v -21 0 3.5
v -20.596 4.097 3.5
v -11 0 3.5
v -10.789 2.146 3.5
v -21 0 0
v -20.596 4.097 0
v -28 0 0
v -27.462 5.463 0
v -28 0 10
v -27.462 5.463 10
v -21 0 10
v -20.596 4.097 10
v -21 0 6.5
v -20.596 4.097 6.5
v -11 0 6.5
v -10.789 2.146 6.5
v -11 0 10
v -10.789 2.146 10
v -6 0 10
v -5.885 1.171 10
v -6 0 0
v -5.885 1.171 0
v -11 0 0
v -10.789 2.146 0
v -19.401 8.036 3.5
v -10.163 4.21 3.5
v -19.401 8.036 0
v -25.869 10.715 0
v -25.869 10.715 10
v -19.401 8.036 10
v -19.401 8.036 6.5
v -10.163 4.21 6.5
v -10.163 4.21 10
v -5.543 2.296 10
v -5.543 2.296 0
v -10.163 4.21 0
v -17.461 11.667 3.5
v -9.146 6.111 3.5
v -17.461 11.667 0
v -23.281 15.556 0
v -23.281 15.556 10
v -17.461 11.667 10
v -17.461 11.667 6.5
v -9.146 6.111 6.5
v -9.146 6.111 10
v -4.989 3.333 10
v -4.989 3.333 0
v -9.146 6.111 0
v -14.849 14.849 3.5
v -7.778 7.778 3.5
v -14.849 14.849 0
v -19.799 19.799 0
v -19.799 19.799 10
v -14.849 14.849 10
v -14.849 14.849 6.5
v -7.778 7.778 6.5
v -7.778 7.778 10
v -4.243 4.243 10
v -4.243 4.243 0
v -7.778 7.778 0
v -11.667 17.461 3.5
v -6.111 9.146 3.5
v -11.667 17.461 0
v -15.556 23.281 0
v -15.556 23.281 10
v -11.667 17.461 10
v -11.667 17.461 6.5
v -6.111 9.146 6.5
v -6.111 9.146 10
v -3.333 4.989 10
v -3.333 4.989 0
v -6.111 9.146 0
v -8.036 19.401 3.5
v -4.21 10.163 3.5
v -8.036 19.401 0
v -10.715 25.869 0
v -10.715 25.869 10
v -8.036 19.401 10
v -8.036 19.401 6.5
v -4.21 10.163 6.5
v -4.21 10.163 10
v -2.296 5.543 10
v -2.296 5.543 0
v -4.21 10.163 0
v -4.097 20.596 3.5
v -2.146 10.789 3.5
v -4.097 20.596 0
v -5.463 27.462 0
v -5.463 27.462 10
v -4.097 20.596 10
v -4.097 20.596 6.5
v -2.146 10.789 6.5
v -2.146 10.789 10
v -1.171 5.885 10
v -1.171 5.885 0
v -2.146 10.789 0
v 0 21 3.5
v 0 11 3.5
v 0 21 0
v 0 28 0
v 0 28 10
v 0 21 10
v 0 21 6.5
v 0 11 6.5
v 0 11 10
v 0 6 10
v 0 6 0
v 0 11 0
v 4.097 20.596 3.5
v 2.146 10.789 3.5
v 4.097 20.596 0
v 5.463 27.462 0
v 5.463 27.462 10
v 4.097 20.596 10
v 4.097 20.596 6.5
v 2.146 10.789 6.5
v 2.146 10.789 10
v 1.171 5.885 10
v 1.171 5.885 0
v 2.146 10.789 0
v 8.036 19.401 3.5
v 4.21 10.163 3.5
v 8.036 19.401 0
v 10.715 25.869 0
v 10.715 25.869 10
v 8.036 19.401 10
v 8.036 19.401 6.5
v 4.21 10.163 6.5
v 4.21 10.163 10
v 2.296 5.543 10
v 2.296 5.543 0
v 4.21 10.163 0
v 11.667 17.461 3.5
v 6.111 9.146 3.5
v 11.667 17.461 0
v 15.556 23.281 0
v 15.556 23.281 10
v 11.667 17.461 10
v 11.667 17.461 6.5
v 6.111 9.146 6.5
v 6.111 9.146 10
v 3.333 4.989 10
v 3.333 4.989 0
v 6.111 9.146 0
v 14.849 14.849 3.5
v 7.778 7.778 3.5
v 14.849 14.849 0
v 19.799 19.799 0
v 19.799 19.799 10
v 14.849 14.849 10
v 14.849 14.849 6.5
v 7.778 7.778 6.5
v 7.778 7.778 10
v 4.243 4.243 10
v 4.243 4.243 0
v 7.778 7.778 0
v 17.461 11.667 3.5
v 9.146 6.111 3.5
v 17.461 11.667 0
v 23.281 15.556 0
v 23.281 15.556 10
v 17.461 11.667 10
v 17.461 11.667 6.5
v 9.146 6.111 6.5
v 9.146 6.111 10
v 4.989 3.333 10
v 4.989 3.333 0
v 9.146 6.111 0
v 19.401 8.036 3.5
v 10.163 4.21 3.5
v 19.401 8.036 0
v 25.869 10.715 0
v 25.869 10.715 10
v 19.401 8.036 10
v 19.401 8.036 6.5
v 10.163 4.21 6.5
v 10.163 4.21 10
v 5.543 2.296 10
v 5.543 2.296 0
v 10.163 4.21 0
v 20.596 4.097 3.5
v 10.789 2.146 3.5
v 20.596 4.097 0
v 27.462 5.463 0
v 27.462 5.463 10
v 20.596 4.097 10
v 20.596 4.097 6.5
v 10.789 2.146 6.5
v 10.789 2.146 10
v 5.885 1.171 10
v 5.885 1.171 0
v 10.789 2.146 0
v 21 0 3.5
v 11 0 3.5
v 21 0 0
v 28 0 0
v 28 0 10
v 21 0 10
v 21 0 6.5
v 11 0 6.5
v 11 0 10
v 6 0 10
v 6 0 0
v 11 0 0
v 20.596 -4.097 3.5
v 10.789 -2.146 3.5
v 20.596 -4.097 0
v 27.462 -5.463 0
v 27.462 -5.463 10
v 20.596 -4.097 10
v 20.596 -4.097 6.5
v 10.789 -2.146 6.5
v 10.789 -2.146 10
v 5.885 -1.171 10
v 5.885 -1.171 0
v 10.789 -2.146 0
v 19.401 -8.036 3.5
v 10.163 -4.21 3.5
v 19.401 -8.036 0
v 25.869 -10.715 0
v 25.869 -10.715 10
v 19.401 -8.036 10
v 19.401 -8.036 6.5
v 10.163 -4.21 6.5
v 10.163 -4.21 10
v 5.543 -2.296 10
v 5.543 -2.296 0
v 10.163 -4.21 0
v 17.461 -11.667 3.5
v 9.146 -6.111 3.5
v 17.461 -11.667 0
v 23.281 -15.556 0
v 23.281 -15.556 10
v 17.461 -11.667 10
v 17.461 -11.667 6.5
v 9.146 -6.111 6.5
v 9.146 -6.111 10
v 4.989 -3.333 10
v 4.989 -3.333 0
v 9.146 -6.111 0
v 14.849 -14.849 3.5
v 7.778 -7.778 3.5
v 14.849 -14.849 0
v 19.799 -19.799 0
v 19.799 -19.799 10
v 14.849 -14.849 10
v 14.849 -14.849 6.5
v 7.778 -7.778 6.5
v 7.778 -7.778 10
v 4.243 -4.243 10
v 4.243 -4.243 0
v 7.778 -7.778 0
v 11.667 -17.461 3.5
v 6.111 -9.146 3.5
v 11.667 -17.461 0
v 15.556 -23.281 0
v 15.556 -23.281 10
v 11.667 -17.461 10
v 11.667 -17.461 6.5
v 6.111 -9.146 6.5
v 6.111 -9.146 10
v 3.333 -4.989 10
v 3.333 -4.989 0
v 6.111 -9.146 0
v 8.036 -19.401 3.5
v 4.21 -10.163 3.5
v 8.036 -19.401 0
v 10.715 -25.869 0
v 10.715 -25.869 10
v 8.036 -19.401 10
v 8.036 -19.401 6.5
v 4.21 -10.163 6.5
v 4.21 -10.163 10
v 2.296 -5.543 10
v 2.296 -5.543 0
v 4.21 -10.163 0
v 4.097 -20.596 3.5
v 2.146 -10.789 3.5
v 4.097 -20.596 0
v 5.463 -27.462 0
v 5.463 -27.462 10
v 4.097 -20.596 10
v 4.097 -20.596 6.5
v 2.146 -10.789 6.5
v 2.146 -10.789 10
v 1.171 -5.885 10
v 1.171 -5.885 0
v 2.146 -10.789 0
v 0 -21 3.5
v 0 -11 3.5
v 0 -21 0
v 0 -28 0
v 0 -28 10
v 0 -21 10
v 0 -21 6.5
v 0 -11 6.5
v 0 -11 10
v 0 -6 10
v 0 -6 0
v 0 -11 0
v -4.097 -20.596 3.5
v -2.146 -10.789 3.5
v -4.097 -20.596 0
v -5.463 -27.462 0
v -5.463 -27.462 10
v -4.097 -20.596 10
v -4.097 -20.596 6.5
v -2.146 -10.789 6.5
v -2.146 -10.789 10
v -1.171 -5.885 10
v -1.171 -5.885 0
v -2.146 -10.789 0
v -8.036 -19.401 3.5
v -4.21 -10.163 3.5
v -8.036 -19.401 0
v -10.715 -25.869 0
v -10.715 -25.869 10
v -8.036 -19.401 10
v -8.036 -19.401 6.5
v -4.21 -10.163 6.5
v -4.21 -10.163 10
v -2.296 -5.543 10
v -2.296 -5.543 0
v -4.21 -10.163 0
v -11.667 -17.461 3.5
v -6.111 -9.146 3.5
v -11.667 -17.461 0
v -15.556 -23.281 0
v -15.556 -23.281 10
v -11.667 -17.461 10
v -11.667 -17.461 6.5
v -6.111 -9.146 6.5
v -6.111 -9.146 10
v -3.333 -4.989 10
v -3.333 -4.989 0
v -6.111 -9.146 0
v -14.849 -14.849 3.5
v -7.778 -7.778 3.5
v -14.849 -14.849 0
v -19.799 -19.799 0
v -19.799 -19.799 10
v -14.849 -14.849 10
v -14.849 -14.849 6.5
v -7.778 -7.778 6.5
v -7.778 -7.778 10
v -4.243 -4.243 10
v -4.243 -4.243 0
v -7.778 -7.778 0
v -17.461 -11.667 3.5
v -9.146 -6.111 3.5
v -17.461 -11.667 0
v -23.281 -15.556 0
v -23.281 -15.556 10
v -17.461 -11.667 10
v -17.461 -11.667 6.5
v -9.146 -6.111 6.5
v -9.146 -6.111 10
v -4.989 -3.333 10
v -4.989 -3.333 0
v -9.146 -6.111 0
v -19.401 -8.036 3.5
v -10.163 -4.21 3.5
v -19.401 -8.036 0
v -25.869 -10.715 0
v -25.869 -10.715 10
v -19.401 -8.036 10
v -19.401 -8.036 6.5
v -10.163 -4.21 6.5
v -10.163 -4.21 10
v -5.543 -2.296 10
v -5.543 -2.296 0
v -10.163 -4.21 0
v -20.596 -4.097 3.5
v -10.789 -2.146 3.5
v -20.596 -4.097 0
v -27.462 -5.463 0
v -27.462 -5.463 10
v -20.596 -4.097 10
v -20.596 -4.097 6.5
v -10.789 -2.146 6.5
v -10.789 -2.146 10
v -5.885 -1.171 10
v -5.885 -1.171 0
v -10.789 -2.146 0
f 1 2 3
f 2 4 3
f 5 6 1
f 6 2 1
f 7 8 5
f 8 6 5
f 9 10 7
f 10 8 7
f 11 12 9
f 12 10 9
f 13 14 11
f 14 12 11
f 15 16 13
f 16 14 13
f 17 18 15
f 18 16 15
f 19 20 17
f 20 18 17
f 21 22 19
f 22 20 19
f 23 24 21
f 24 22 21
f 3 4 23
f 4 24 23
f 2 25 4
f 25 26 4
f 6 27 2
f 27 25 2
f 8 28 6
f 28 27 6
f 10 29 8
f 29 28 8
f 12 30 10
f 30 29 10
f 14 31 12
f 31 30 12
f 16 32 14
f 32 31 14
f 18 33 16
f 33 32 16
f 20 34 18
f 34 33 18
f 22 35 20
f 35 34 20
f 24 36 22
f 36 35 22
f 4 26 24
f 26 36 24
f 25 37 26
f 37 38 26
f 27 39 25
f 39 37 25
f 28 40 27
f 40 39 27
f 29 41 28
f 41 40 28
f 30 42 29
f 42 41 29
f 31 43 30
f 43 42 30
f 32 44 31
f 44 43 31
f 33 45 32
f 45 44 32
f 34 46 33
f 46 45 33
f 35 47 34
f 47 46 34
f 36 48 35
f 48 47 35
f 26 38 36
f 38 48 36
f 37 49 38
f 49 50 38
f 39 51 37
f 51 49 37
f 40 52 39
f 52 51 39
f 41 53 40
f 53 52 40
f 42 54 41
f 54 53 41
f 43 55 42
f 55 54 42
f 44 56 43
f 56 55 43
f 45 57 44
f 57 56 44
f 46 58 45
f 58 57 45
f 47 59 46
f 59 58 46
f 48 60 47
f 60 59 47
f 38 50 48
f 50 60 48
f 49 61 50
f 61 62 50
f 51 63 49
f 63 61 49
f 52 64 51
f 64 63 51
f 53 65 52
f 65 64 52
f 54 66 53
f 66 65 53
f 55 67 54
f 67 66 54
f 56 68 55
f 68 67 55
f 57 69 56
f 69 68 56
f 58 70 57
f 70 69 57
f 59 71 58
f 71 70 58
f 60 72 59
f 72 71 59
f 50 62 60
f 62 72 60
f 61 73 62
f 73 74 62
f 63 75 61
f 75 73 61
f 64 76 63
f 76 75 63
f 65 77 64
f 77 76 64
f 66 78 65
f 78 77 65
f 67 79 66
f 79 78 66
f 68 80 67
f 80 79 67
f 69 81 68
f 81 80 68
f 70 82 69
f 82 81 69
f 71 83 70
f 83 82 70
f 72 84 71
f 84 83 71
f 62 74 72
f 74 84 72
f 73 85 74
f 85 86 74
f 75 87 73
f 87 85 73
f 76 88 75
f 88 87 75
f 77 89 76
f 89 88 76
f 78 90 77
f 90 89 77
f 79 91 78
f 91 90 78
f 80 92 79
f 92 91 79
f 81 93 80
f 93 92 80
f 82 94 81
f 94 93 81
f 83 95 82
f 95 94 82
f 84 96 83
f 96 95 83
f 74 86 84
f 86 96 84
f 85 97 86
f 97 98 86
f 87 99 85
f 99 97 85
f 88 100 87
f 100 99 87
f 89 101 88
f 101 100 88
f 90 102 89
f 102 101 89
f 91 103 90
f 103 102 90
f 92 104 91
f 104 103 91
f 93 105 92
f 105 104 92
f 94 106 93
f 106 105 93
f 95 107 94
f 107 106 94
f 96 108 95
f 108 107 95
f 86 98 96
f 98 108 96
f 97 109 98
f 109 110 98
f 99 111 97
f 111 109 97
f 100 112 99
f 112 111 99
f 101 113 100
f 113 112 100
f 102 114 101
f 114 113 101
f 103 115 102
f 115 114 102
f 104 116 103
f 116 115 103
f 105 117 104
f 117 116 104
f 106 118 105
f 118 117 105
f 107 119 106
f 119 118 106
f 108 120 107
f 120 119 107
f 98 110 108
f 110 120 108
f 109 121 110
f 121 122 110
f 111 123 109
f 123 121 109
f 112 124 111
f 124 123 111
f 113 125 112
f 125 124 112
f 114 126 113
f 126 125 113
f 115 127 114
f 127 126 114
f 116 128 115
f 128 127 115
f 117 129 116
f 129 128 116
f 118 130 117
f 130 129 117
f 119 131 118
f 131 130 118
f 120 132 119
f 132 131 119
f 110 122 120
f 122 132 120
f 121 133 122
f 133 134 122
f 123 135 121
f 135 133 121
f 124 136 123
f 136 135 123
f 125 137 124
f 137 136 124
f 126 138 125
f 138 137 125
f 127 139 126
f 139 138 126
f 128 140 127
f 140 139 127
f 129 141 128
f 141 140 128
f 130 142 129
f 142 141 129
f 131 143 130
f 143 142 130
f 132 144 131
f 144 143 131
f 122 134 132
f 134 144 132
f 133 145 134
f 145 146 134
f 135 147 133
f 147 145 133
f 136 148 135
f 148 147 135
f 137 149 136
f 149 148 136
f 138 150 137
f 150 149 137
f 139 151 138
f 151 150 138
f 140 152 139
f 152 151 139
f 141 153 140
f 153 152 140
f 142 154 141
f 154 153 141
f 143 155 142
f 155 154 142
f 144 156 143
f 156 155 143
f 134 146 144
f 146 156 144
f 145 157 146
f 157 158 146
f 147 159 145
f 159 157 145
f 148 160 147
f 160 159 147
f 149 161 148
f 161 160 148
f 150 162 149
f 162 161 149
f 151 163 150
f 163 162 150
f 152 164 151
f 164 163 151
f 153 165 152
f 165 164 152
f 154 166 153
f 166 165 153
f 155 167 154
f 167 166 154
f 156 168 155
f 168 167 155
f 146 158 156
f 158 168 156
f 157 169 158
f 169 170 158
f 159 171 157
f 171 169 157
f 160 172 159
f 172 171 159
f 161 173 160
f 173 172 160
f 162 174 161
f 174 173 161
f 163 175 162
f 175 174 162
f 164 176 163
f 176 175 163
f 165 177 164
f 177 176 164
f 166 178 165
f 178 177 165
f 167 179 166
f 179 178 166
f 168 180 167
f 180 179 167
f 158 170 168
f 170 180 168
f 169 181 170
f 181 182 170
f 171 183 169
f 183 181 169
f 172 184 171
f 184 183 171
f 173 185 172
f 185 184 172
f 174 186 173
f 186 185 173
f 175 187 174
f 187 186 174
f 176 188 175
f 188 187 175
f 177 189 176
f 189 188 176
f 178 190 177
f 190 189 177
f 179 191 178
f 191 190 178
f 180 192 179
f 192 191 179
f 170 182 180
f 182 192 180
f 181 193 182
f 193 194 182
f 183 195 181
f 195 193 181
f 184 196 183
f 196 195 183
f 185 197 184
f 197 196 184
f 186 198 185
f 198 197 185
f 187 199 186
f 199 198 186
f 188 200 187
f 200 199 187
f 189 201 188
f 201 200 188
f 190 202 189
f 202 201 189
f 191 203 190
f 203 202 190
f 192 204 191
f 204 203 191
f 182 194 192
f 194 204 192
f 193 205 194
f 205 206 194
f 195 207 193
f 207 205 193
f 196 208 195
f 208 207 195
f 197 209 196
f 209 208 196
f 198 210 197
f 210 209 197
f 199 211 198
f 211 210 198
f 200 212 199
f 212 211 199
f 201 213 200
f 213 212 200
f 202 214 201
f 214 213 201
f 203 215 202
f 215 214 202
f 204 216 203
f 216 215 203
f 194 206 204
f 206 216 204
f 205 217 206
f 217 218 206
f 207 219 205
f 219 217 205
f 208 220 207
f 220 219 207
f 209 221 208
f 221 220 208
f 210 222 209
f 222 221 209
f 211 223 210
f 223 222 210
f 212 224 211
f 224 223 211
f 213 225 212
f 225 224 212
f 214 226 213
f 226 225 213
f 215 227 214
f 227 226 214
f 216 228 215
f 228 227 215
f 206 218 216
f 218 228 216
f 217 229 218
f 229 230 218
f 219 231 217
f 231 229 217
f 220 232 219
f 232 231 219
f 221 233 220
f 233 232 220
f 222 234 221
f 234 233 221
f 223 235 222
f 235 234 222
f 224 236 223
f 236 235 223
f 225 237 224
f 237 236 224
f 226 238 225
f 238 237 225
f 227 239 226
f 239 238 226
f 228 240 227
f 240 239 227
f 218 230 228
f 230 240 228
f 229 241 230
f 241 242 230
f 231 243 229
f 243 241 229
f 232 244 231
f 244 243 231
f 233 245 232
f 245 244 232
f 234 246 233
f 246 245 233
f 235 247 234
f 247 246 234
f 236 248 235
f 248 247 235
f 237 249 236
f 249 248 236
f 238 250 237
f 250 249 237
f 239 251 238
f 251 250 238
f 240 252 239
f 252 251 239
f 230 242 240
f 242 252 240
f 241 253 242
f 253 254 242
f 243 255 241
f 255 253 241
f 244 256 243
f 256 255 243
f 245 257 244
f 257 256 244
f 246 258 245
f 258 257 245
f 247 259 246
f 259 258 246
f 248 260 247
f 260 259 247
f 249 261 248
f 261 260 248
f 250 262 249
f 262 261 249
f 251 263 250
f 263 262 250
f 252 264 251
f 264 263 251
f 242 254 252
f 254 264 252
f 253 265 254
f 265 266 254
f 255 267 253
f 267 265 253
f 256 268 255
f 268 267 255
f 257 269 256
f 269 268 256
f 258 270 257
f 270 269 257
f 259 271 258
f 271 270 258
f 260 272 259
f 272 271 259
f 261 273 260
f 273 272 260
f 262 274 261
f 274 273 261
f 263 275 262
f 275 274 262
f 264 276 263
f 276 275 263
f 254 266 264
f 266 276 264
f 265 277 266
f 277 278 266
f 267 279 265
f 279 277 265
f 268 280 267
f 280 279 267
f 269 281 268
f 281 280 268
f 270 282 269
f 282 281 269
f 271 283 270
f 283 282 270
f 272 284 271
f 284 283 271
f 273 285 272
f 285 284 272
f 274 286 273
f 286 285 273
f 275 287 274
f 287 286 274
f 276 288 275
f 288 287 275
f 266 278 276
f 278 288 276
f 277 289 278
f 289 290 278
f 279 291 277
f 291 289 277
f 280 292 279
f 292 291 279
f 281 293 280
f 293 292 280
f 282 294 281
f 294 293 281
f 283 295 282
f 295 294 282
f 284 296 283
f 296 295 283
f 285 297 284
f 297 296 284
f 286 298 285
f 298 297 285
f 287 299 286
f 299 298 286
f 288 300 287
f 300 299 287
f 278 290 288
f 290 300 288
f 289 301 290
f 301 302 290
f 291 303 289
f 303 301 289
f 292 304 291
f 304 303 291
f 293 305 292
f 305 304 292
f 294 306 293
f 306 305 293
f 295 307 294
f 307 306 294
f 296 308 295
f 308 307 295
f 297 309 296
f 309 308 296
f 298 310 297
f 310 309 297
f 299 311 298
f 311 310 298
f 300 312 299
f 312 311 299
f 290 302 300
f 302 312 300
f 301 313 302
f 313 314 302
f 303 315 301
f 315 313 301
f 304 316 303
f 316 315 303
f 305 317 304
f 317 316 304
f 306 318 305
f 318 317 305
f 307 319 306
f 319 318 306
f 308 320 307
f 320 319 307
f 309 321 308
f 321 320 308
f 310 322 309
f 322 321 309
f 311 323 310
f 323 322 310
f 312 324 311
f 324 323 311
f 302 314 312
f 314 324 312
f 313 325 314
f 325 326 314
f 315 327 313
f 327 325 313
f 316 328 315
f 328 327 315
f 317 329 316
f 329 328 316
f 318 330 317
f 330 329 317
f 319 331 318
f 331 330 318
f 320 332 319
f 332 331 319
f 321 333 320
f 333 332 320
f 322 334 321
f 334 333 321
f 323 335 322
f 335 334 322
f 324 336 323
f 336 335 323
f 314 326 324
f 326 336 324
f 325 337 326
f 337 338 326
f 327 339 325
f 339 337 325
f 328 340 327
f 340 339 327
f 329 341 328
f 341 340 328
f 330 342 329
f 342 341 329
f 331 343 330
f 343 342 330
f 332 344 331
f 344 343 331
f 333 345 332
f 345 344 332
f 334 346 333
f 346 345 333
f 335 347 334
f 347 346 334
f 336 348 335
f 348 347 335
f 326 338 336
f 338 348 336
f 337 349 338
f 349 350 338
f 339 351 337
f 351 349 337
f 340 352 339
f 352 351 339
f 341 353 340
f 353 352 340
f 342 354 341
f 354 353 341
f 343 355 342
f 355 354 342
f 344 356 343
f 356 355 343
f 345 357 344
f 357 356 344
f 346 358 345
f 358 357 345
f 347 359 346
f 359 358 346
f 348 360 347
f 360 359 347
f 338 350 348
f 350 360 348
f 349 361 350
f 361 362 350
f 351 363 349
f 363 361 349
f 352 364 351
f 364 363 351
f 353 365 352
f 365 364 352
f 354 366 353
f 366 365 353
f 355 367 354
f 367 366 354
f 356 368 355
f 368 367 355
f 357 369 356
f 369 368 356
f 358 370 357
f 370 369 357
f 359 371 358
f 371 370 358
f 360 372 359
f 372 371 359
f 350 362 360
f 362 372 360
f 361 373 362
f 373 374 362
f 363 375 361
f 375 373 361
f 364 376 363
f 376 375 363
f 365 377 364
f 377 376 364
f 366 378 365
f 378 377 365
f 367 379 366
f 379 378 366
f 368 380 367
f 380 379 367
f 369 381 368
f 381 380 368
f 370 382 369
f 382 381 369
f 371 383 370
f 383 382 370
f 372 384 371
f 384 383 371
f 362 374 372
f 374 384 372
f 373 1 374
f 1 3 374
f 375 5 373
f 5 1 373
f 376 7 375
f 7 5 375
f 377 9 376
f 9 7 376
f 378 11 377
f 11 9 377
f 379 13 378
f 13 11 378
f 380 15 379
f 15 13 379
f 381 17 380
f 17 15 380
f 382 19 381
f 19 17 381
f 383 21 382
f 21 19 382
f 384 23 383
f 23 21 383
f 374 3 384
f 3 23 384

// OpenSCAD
$fn = 32;

// ----------------------------------------------------------------------
// Revolved part: handwheel R28
// ----------------------------------------------------------------------

// --- parameters (mm) ---
bore_r = 6;               // bore radius
rim_r = 28;               // rim radius
rim_w = 7;                // rim axial width
rim_t = 10;               // rim diameter height
hub_r = 11;               // hub radius
web_t = 3;                // web thickness
revolve_angle = 360;      // revolve sweep, degrees

bore_d = 2 * bore_r;
rim_d = 2 * rim_r;
hub_d = 2 * hub_r;

profile = [[6, 0], [11, 0], [11, 3.5], [21, 3.5], [21, 0], [28, 0], [28, 10], [21, 10], [21, 6.5], [11, 6.5], [11, 10], [6, 10]];  // primary outline, 12 points, counter clockwise

// --- the one profile operation ---
rotate_extrude(angle = revolve_angle) polygon(points = profile);
